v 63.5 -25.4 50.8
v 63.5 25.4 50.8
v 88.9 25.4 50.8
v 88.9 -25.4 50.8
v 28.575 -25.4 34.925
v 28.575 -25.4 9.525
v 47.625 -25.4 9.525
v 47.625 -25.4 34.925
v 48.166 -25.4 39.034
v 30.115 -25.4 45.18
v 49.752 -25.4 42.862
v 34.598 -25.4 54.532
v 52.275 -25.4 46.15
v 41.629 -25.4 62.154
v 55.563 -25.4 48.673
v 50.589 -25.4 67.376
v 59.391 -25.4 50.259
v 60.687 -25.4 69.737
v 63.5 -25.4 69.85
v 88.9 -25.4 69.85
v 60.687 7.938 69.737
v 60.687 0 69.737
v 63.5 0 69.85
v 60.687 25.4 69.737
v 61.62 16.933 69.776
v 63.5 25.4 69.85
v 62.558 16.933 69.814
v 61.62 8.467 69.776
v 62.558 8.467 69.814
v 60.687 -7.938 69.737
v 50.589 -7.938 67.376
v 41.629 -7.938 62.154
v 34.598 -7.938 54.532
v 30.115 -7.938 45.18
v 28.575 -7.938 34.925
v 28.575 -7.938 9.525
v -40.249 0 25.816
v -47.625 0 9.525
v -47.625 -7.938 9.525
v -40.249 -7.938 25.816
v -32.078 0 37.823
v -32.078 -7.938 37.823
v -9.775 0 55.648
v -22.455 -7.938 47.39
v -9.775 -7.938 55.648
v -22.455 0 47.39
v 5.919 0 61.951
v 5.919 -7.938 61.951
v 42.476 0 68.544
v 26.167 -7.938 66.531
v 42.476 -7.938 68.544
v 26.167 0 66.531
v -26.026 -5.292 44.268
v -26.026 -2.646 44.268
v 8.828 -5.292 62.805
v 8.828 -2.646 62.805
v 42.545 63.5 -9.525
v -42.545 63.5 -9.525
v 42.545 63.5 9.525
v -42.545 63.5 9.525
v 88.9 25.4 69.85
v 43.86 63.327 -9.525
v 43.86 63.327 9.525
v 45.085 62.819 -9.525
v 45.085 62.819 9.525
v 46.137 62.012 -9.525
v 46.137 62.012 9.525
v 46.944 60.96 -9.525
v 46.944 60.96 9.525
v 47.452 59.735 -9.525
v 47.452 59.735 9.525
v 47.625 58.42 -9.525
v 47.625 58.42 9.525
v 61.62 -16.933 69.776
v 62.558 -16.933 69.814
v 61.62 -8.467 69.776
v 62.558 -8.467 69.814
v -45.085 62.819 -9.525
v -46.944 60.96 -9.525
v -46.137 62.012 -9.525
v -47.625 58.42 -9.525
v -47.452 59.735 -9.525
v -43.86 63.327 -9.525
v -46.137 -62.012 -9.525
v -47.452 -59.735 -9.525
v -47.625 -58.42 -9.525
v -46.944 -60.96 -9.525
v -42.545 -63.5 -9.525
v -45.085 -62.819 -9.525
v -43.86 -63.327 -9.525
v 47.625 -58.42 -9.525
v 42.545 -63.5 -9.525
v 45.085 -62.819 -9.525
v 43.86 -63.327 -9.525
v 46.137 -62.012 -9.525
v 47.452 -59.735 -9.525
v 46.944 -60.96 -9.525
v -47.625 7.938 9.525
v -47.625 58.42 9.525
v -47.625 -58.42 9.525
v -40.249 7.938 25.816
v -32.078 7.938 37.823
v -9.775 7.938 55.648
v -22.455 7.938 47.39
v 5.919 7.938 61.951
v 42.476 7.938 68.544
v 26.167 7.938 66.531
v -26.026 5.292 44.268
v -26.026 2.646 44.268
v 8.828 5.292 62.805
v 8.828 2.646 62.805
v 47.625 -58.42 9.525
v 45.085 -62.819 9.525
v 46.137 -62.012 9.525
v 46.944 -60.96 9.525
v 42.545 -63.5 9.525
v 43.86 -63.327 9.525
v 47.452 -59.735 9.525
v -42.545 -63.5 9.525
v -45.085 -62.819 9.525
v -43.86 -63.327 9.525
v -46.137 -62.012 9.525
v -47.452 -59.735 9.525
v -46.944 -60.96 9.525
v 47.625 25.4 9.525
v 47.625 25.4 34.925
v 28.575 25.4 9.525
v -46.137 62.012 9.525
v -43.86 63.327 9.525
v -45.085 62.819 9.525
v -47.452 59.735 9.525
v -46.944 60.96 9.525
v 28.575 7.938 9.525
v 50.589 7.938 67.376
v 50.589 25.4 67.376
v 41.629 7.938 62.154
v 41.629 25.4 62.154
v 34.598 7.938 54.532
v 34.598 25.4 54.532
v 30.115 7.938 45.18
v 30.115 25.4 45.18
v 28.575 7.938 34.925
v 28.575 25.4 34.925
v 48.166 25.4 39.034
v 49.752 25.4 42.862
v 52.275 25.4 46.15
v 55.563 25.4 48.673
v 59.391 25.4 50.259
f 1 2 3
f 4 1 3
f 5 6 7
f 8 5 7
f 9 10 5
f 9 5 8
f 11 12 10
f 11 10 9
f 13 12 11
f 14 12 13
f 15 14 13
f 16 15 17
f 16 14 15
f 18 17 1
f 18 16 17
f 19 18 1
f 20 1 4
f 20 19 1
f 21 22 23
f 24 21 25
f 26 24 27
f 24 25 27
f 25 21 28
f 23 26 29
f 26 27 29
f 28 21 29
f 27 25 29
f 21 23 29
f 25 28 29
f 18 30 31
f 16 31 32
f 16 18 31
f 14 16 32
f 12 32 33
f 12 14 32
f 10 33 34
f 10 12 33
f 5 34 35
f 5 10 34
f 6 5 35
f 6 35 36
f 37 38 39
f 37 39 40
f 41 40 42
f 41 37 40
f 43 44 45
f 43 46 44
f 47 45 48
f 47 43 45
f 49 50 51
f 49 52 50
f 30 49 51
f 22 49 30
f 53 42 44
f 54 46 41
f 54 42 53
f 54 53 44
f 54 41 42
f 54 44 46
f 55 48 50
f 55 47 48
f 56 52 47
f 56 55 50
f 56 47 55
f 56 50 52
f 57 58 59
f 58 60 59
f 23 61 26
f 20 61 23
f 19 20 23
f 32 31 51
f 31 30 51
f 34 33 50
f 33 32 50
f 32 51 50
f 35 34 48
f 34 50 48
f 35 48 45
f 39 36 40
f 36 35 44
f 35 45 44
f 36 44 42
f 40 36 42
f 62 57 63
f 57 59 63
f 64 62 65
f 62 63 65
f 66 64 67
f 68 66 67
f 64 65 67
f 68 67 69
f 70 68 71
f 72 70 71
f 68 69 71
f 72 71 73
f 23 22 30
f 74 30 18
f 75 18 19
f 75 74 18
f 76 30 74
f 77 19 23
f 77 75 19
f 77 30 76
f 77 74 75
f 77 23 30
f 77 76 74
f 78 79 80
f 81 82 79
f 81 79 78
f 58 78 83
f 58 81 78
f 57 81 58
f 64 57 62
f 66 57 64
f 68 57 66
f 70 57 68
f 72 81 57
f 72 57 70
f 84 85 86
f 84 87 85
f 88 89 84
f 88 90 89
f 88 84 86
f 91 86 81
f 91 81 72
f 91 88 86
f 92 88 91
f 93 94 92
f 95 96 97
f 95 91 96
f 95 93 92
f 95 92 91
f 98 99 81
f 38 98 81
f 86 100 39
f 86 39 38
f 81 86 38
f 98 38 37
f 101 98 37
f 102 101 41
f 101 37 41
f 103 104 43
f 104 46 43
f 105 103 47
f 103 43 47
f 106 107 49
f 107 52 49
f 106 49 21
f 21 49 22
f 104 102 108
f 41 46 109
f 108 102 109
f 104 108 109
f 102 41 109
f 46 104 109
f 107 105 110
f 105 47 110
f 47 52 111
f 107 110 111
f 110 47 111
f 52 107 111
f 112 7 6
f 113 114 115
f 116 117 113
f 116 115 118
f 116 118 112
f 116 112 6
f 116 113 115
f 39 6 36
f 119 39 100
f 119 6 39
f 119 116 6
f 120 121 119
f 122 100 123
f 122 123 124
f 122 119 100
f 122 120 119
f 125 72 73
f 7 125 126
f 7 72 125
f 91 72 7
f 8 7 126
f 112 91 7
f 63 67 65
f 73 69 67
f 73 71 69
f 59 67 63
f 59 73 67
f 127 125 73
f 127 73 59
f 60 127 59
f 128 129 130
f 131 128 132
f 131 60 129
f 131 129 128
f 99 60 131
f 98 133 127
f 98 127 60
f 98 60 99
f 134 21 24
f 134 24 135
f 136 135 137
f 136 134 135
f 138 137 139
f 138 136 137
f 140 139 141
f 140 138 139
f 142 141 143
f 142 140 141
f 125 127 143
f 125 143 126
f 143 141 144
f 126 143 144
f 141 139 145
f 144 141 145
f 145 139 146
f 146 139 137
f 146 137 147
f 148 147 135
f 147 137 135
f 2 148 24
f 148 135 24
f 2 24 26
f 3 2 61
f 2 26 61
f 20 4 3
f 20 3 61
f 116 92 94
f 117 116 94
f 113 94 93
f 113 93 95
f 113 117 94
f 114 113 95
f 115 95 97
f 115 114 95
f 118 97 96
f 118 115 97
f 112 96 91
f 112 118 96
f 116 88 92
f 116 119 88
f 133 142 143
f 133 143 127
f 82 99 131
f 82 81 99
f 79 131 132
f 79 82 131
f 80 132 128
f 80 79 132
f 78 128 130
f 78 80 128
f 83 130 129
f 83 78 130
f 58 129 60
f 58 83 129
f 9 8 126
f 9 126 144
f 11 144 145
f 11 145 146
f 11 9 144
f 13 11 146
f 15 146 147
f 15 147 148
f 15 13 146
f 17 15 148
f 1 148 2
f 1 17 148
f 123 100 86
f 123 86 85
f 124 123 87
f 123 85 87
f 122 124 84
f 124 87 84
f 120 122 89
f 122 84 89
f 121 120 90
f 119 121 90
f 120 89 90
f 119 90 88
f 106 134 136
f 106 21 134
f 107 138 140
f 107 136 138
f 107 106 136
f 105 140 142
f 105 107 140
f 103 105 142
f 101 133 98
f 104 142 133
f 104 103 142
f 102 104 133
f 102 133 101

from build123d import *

# Parameters (mm, degrees)
F1_DEPTH = 63.5
F2_DEPTH = 25.4
F3_DEPTH = 7.9375
F4_R     = 5.08


with BuildPart() as f1:
    # F0 (on Front) → F1 (new body, symmetric)
    with BuildSketch(Plane.XZ):
        Polygon((28.575, 9.525), (-47.625, 9.525), (-47.625, -9.525), (47.625, -9.525), (47.625, 9.525), align=None)
    extrude(amount=F1_DEPTH, both=True)

    # F0 (on Front) → F2 (join, symmetric)
    with BuildSketch(Plane.XZ):
        with BuildLine():
            Line((28.575, 34.925), (28.575, 9.525))
            Line((28.575, 9.525), (47.625, 9.525))
            Line((47.625, 9.525), (47.625, 34.925))
            ThreePointArc((47.625, 34.925), (52.27468, 46.15032), (63.5, 50.8))
            Line((63.5, 50.8), (88.9, 50.8))
            Line((88.9, 50.8), (88.9, 69.85))
            Line((88.9, 69.85), (63.5, 69.85))
            add(Edge.make_bspline(
                [(60.686772, 69.736512), (61.617392, 69.776715), (62.555116, 69.814521), (63.5, 69.85)],
                knots=[124.561672, 124.561672, 124.561672, 124.561672, 126.443154, 126.443154, 126.443154, 126.443154], degree=3))
            ThreePointArc((60.686772, 69.736512), (37.828931, 58.605199), (28.575, 34.925))
        make_face()
    extrude(amount=F2_DEPTH, both=True)

    # F0 (on Front) → F3 (join, symmetric)
    with BuildSketch(Plane.XZ):
        with BuildLine():
            add(Edge.make_bspline(
                [(-47.625, 9.525), (-31.403715, 53.903915), (-0.924034, 67.074893), (60.686772, 69.736512)],
                knots=[0, 0, 0, 0, 124.561672, 124.561672, 124.561672, 124.561672], degree=3))
            Line((-47.625, 9.525), (28.575, 9.525))
            Line((28.575, 9.525), (28.575, 34.925))
            ThreePointArc((28.575, 34.925), (37.828931, 58.605199), (60.686772, 69.736512))
        make_face()
    extrude(amount=F3_DEPTH, both=True)

    # F4
    f4_edges = [f1.edges().sort_by_distance(p)[0] for p in [
        (-47.625, -63.5, 0),
        (47.625, -63.5, 0),
        (-47.625, 63.5, 0),
        (47.625, 63.5, 0),
    ]]
    fillet(f4_edges, radius=F4_R)


solid = f1.part
